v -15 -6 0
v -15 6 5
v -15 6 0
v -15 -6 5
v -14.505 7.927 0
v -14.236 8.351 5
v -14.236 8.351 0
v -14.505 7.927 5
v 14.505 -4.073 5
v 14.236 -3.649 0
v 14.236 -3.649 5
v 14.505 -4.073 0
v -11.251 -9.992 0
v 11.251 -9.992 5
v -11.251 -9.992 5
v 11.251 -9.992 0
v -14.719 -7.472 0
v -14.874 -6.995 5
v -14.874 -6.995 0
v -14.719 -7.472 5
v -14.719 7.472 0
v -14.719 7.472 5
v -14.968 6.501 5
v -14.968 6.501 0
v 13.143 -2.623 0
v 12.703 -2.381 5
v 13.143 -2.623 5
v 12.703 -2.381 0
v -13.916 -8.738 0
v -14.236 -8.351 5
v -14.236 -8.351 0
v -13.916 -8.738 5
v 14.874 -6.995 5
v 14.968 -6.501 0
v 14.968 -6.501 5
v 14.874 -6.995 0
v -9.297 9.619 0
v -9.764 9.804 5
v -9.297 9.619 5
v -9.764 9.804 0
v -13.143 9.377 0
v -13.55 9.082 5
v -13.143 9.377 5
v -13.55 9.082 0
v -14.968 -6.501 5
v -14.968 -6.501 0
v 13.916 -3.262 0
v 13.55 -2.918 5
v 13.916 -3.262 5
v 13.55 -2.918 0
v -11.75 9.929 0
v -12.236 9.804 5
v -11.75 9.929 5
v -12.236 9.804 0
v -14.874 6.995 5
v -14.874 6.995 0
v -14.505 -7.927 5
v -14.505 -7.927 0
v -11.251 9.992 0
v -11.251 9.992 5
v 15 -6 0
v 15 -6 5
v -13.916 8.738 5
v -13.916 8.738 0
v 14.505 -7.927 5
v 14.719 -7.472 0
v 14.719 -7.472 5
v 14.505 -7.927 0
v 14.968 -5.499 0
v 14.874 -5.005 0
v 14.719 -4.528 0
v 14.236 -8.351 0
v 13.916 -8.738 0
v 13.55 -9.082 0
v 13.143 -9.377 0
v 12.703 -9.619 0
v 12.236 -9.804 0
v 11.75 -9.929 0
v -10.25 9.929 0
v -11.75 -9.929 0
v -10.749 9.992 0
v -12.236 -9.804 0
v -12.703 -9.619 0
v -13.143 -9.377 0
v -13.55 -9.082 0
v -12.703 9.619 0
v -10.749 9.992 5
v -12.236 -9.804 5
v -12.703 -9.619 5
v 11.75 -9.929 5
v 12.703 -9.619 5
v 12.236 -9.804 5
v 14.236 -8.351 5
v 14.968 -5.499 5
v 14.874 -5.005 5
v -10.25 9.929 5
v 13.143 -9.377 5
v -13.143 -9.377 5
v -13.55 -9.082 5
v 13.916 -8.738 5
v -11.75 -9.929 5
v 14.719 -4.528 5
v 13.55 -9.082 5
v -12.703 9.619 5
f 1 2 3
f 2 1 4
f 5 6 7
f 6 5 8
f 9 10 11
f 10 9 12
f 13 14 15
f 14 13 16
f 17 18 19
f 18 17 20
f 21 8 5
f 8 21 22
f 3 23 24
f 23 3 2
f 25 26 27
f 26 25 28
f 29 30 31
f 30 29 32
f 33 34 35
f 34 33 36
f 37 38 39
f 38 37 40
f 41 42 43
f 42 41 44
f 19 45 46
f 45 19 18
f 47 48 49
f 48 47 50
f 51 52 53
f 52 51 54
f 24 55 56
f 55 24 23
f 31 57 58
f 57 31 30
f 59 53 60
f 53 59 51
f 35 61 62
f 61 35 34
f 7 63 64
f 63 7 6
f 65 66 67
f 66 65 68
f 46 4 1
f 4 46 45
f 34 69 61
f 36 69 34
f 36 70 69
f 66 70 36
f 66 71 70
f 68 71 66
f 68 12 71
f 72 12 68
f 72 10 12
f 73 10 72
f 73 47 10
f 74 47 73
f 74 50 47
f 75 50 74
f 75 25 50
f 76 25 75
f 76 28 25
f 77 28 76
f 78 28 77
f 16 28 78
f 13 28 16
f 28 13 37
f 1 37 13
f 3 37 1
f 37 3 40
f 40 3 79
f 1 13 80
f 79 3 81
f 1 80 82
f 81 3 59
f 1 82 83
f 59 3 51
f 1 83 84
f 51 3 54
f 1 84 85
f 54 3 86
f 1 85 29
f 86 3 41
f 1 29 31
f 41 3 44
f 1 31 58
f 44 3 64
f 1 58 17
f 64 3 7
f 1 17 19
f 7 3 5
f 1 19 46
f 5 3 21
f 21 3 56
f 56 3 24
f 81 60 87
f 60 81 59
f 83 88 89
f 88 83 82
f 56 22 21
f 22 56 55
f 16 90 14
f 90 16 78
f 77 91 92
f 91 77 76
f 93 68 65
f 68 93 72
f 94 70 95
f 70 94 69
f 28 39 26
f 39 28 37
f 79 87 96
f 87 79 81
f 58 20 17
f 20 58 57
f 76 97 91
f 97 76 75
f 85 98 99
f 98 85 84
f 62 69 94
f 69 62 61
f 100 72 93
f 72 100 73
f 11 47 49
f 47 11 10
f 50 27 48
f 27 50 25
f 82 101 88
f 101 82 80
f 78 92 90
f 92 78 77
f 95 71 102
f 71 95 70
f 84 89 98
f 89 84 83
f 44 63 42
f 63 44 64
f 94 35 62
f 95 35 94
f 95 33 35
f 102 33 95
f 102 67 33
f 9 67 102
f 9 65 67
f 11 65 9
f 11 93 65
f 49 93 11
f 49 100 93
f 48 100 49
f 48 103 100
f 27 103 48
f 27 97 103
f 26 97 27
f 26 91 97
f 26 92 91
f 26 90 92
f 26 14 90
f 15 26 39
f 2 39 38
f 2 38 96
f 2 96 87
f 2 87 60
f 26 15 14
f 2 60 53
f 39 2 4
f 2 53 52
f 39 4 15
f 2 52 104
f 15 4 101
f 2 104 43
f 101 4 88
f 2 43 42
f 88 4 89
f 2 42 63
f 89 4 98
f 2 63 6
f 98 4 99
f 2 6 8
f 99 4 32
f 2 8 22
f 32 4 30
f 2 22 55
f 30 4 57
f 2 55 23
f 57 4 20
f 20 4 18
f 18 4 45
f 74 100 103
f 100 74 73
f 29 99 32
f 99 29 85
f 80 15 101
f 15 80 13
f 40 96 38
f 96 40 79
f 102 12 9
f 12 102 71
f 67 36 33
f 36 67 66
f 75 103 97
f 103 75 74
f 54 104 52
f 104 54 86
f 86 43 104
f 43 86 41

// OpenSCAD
$fn = 50;

difference() {
	union() {
		hull() {
			translate(v = [-11.0, 6.0, 0]) {
				cylinder(h = 5, r = 4);
			}
			translate(v = [-11.0, -6.0, 0]) {
				cylinder(h = 5, r = 4);
			}
			translate(v = [11.0, -6.0, 0]) {
				cylinder(h = 5, r = 4);
			}
		}
	}
	union();
}
